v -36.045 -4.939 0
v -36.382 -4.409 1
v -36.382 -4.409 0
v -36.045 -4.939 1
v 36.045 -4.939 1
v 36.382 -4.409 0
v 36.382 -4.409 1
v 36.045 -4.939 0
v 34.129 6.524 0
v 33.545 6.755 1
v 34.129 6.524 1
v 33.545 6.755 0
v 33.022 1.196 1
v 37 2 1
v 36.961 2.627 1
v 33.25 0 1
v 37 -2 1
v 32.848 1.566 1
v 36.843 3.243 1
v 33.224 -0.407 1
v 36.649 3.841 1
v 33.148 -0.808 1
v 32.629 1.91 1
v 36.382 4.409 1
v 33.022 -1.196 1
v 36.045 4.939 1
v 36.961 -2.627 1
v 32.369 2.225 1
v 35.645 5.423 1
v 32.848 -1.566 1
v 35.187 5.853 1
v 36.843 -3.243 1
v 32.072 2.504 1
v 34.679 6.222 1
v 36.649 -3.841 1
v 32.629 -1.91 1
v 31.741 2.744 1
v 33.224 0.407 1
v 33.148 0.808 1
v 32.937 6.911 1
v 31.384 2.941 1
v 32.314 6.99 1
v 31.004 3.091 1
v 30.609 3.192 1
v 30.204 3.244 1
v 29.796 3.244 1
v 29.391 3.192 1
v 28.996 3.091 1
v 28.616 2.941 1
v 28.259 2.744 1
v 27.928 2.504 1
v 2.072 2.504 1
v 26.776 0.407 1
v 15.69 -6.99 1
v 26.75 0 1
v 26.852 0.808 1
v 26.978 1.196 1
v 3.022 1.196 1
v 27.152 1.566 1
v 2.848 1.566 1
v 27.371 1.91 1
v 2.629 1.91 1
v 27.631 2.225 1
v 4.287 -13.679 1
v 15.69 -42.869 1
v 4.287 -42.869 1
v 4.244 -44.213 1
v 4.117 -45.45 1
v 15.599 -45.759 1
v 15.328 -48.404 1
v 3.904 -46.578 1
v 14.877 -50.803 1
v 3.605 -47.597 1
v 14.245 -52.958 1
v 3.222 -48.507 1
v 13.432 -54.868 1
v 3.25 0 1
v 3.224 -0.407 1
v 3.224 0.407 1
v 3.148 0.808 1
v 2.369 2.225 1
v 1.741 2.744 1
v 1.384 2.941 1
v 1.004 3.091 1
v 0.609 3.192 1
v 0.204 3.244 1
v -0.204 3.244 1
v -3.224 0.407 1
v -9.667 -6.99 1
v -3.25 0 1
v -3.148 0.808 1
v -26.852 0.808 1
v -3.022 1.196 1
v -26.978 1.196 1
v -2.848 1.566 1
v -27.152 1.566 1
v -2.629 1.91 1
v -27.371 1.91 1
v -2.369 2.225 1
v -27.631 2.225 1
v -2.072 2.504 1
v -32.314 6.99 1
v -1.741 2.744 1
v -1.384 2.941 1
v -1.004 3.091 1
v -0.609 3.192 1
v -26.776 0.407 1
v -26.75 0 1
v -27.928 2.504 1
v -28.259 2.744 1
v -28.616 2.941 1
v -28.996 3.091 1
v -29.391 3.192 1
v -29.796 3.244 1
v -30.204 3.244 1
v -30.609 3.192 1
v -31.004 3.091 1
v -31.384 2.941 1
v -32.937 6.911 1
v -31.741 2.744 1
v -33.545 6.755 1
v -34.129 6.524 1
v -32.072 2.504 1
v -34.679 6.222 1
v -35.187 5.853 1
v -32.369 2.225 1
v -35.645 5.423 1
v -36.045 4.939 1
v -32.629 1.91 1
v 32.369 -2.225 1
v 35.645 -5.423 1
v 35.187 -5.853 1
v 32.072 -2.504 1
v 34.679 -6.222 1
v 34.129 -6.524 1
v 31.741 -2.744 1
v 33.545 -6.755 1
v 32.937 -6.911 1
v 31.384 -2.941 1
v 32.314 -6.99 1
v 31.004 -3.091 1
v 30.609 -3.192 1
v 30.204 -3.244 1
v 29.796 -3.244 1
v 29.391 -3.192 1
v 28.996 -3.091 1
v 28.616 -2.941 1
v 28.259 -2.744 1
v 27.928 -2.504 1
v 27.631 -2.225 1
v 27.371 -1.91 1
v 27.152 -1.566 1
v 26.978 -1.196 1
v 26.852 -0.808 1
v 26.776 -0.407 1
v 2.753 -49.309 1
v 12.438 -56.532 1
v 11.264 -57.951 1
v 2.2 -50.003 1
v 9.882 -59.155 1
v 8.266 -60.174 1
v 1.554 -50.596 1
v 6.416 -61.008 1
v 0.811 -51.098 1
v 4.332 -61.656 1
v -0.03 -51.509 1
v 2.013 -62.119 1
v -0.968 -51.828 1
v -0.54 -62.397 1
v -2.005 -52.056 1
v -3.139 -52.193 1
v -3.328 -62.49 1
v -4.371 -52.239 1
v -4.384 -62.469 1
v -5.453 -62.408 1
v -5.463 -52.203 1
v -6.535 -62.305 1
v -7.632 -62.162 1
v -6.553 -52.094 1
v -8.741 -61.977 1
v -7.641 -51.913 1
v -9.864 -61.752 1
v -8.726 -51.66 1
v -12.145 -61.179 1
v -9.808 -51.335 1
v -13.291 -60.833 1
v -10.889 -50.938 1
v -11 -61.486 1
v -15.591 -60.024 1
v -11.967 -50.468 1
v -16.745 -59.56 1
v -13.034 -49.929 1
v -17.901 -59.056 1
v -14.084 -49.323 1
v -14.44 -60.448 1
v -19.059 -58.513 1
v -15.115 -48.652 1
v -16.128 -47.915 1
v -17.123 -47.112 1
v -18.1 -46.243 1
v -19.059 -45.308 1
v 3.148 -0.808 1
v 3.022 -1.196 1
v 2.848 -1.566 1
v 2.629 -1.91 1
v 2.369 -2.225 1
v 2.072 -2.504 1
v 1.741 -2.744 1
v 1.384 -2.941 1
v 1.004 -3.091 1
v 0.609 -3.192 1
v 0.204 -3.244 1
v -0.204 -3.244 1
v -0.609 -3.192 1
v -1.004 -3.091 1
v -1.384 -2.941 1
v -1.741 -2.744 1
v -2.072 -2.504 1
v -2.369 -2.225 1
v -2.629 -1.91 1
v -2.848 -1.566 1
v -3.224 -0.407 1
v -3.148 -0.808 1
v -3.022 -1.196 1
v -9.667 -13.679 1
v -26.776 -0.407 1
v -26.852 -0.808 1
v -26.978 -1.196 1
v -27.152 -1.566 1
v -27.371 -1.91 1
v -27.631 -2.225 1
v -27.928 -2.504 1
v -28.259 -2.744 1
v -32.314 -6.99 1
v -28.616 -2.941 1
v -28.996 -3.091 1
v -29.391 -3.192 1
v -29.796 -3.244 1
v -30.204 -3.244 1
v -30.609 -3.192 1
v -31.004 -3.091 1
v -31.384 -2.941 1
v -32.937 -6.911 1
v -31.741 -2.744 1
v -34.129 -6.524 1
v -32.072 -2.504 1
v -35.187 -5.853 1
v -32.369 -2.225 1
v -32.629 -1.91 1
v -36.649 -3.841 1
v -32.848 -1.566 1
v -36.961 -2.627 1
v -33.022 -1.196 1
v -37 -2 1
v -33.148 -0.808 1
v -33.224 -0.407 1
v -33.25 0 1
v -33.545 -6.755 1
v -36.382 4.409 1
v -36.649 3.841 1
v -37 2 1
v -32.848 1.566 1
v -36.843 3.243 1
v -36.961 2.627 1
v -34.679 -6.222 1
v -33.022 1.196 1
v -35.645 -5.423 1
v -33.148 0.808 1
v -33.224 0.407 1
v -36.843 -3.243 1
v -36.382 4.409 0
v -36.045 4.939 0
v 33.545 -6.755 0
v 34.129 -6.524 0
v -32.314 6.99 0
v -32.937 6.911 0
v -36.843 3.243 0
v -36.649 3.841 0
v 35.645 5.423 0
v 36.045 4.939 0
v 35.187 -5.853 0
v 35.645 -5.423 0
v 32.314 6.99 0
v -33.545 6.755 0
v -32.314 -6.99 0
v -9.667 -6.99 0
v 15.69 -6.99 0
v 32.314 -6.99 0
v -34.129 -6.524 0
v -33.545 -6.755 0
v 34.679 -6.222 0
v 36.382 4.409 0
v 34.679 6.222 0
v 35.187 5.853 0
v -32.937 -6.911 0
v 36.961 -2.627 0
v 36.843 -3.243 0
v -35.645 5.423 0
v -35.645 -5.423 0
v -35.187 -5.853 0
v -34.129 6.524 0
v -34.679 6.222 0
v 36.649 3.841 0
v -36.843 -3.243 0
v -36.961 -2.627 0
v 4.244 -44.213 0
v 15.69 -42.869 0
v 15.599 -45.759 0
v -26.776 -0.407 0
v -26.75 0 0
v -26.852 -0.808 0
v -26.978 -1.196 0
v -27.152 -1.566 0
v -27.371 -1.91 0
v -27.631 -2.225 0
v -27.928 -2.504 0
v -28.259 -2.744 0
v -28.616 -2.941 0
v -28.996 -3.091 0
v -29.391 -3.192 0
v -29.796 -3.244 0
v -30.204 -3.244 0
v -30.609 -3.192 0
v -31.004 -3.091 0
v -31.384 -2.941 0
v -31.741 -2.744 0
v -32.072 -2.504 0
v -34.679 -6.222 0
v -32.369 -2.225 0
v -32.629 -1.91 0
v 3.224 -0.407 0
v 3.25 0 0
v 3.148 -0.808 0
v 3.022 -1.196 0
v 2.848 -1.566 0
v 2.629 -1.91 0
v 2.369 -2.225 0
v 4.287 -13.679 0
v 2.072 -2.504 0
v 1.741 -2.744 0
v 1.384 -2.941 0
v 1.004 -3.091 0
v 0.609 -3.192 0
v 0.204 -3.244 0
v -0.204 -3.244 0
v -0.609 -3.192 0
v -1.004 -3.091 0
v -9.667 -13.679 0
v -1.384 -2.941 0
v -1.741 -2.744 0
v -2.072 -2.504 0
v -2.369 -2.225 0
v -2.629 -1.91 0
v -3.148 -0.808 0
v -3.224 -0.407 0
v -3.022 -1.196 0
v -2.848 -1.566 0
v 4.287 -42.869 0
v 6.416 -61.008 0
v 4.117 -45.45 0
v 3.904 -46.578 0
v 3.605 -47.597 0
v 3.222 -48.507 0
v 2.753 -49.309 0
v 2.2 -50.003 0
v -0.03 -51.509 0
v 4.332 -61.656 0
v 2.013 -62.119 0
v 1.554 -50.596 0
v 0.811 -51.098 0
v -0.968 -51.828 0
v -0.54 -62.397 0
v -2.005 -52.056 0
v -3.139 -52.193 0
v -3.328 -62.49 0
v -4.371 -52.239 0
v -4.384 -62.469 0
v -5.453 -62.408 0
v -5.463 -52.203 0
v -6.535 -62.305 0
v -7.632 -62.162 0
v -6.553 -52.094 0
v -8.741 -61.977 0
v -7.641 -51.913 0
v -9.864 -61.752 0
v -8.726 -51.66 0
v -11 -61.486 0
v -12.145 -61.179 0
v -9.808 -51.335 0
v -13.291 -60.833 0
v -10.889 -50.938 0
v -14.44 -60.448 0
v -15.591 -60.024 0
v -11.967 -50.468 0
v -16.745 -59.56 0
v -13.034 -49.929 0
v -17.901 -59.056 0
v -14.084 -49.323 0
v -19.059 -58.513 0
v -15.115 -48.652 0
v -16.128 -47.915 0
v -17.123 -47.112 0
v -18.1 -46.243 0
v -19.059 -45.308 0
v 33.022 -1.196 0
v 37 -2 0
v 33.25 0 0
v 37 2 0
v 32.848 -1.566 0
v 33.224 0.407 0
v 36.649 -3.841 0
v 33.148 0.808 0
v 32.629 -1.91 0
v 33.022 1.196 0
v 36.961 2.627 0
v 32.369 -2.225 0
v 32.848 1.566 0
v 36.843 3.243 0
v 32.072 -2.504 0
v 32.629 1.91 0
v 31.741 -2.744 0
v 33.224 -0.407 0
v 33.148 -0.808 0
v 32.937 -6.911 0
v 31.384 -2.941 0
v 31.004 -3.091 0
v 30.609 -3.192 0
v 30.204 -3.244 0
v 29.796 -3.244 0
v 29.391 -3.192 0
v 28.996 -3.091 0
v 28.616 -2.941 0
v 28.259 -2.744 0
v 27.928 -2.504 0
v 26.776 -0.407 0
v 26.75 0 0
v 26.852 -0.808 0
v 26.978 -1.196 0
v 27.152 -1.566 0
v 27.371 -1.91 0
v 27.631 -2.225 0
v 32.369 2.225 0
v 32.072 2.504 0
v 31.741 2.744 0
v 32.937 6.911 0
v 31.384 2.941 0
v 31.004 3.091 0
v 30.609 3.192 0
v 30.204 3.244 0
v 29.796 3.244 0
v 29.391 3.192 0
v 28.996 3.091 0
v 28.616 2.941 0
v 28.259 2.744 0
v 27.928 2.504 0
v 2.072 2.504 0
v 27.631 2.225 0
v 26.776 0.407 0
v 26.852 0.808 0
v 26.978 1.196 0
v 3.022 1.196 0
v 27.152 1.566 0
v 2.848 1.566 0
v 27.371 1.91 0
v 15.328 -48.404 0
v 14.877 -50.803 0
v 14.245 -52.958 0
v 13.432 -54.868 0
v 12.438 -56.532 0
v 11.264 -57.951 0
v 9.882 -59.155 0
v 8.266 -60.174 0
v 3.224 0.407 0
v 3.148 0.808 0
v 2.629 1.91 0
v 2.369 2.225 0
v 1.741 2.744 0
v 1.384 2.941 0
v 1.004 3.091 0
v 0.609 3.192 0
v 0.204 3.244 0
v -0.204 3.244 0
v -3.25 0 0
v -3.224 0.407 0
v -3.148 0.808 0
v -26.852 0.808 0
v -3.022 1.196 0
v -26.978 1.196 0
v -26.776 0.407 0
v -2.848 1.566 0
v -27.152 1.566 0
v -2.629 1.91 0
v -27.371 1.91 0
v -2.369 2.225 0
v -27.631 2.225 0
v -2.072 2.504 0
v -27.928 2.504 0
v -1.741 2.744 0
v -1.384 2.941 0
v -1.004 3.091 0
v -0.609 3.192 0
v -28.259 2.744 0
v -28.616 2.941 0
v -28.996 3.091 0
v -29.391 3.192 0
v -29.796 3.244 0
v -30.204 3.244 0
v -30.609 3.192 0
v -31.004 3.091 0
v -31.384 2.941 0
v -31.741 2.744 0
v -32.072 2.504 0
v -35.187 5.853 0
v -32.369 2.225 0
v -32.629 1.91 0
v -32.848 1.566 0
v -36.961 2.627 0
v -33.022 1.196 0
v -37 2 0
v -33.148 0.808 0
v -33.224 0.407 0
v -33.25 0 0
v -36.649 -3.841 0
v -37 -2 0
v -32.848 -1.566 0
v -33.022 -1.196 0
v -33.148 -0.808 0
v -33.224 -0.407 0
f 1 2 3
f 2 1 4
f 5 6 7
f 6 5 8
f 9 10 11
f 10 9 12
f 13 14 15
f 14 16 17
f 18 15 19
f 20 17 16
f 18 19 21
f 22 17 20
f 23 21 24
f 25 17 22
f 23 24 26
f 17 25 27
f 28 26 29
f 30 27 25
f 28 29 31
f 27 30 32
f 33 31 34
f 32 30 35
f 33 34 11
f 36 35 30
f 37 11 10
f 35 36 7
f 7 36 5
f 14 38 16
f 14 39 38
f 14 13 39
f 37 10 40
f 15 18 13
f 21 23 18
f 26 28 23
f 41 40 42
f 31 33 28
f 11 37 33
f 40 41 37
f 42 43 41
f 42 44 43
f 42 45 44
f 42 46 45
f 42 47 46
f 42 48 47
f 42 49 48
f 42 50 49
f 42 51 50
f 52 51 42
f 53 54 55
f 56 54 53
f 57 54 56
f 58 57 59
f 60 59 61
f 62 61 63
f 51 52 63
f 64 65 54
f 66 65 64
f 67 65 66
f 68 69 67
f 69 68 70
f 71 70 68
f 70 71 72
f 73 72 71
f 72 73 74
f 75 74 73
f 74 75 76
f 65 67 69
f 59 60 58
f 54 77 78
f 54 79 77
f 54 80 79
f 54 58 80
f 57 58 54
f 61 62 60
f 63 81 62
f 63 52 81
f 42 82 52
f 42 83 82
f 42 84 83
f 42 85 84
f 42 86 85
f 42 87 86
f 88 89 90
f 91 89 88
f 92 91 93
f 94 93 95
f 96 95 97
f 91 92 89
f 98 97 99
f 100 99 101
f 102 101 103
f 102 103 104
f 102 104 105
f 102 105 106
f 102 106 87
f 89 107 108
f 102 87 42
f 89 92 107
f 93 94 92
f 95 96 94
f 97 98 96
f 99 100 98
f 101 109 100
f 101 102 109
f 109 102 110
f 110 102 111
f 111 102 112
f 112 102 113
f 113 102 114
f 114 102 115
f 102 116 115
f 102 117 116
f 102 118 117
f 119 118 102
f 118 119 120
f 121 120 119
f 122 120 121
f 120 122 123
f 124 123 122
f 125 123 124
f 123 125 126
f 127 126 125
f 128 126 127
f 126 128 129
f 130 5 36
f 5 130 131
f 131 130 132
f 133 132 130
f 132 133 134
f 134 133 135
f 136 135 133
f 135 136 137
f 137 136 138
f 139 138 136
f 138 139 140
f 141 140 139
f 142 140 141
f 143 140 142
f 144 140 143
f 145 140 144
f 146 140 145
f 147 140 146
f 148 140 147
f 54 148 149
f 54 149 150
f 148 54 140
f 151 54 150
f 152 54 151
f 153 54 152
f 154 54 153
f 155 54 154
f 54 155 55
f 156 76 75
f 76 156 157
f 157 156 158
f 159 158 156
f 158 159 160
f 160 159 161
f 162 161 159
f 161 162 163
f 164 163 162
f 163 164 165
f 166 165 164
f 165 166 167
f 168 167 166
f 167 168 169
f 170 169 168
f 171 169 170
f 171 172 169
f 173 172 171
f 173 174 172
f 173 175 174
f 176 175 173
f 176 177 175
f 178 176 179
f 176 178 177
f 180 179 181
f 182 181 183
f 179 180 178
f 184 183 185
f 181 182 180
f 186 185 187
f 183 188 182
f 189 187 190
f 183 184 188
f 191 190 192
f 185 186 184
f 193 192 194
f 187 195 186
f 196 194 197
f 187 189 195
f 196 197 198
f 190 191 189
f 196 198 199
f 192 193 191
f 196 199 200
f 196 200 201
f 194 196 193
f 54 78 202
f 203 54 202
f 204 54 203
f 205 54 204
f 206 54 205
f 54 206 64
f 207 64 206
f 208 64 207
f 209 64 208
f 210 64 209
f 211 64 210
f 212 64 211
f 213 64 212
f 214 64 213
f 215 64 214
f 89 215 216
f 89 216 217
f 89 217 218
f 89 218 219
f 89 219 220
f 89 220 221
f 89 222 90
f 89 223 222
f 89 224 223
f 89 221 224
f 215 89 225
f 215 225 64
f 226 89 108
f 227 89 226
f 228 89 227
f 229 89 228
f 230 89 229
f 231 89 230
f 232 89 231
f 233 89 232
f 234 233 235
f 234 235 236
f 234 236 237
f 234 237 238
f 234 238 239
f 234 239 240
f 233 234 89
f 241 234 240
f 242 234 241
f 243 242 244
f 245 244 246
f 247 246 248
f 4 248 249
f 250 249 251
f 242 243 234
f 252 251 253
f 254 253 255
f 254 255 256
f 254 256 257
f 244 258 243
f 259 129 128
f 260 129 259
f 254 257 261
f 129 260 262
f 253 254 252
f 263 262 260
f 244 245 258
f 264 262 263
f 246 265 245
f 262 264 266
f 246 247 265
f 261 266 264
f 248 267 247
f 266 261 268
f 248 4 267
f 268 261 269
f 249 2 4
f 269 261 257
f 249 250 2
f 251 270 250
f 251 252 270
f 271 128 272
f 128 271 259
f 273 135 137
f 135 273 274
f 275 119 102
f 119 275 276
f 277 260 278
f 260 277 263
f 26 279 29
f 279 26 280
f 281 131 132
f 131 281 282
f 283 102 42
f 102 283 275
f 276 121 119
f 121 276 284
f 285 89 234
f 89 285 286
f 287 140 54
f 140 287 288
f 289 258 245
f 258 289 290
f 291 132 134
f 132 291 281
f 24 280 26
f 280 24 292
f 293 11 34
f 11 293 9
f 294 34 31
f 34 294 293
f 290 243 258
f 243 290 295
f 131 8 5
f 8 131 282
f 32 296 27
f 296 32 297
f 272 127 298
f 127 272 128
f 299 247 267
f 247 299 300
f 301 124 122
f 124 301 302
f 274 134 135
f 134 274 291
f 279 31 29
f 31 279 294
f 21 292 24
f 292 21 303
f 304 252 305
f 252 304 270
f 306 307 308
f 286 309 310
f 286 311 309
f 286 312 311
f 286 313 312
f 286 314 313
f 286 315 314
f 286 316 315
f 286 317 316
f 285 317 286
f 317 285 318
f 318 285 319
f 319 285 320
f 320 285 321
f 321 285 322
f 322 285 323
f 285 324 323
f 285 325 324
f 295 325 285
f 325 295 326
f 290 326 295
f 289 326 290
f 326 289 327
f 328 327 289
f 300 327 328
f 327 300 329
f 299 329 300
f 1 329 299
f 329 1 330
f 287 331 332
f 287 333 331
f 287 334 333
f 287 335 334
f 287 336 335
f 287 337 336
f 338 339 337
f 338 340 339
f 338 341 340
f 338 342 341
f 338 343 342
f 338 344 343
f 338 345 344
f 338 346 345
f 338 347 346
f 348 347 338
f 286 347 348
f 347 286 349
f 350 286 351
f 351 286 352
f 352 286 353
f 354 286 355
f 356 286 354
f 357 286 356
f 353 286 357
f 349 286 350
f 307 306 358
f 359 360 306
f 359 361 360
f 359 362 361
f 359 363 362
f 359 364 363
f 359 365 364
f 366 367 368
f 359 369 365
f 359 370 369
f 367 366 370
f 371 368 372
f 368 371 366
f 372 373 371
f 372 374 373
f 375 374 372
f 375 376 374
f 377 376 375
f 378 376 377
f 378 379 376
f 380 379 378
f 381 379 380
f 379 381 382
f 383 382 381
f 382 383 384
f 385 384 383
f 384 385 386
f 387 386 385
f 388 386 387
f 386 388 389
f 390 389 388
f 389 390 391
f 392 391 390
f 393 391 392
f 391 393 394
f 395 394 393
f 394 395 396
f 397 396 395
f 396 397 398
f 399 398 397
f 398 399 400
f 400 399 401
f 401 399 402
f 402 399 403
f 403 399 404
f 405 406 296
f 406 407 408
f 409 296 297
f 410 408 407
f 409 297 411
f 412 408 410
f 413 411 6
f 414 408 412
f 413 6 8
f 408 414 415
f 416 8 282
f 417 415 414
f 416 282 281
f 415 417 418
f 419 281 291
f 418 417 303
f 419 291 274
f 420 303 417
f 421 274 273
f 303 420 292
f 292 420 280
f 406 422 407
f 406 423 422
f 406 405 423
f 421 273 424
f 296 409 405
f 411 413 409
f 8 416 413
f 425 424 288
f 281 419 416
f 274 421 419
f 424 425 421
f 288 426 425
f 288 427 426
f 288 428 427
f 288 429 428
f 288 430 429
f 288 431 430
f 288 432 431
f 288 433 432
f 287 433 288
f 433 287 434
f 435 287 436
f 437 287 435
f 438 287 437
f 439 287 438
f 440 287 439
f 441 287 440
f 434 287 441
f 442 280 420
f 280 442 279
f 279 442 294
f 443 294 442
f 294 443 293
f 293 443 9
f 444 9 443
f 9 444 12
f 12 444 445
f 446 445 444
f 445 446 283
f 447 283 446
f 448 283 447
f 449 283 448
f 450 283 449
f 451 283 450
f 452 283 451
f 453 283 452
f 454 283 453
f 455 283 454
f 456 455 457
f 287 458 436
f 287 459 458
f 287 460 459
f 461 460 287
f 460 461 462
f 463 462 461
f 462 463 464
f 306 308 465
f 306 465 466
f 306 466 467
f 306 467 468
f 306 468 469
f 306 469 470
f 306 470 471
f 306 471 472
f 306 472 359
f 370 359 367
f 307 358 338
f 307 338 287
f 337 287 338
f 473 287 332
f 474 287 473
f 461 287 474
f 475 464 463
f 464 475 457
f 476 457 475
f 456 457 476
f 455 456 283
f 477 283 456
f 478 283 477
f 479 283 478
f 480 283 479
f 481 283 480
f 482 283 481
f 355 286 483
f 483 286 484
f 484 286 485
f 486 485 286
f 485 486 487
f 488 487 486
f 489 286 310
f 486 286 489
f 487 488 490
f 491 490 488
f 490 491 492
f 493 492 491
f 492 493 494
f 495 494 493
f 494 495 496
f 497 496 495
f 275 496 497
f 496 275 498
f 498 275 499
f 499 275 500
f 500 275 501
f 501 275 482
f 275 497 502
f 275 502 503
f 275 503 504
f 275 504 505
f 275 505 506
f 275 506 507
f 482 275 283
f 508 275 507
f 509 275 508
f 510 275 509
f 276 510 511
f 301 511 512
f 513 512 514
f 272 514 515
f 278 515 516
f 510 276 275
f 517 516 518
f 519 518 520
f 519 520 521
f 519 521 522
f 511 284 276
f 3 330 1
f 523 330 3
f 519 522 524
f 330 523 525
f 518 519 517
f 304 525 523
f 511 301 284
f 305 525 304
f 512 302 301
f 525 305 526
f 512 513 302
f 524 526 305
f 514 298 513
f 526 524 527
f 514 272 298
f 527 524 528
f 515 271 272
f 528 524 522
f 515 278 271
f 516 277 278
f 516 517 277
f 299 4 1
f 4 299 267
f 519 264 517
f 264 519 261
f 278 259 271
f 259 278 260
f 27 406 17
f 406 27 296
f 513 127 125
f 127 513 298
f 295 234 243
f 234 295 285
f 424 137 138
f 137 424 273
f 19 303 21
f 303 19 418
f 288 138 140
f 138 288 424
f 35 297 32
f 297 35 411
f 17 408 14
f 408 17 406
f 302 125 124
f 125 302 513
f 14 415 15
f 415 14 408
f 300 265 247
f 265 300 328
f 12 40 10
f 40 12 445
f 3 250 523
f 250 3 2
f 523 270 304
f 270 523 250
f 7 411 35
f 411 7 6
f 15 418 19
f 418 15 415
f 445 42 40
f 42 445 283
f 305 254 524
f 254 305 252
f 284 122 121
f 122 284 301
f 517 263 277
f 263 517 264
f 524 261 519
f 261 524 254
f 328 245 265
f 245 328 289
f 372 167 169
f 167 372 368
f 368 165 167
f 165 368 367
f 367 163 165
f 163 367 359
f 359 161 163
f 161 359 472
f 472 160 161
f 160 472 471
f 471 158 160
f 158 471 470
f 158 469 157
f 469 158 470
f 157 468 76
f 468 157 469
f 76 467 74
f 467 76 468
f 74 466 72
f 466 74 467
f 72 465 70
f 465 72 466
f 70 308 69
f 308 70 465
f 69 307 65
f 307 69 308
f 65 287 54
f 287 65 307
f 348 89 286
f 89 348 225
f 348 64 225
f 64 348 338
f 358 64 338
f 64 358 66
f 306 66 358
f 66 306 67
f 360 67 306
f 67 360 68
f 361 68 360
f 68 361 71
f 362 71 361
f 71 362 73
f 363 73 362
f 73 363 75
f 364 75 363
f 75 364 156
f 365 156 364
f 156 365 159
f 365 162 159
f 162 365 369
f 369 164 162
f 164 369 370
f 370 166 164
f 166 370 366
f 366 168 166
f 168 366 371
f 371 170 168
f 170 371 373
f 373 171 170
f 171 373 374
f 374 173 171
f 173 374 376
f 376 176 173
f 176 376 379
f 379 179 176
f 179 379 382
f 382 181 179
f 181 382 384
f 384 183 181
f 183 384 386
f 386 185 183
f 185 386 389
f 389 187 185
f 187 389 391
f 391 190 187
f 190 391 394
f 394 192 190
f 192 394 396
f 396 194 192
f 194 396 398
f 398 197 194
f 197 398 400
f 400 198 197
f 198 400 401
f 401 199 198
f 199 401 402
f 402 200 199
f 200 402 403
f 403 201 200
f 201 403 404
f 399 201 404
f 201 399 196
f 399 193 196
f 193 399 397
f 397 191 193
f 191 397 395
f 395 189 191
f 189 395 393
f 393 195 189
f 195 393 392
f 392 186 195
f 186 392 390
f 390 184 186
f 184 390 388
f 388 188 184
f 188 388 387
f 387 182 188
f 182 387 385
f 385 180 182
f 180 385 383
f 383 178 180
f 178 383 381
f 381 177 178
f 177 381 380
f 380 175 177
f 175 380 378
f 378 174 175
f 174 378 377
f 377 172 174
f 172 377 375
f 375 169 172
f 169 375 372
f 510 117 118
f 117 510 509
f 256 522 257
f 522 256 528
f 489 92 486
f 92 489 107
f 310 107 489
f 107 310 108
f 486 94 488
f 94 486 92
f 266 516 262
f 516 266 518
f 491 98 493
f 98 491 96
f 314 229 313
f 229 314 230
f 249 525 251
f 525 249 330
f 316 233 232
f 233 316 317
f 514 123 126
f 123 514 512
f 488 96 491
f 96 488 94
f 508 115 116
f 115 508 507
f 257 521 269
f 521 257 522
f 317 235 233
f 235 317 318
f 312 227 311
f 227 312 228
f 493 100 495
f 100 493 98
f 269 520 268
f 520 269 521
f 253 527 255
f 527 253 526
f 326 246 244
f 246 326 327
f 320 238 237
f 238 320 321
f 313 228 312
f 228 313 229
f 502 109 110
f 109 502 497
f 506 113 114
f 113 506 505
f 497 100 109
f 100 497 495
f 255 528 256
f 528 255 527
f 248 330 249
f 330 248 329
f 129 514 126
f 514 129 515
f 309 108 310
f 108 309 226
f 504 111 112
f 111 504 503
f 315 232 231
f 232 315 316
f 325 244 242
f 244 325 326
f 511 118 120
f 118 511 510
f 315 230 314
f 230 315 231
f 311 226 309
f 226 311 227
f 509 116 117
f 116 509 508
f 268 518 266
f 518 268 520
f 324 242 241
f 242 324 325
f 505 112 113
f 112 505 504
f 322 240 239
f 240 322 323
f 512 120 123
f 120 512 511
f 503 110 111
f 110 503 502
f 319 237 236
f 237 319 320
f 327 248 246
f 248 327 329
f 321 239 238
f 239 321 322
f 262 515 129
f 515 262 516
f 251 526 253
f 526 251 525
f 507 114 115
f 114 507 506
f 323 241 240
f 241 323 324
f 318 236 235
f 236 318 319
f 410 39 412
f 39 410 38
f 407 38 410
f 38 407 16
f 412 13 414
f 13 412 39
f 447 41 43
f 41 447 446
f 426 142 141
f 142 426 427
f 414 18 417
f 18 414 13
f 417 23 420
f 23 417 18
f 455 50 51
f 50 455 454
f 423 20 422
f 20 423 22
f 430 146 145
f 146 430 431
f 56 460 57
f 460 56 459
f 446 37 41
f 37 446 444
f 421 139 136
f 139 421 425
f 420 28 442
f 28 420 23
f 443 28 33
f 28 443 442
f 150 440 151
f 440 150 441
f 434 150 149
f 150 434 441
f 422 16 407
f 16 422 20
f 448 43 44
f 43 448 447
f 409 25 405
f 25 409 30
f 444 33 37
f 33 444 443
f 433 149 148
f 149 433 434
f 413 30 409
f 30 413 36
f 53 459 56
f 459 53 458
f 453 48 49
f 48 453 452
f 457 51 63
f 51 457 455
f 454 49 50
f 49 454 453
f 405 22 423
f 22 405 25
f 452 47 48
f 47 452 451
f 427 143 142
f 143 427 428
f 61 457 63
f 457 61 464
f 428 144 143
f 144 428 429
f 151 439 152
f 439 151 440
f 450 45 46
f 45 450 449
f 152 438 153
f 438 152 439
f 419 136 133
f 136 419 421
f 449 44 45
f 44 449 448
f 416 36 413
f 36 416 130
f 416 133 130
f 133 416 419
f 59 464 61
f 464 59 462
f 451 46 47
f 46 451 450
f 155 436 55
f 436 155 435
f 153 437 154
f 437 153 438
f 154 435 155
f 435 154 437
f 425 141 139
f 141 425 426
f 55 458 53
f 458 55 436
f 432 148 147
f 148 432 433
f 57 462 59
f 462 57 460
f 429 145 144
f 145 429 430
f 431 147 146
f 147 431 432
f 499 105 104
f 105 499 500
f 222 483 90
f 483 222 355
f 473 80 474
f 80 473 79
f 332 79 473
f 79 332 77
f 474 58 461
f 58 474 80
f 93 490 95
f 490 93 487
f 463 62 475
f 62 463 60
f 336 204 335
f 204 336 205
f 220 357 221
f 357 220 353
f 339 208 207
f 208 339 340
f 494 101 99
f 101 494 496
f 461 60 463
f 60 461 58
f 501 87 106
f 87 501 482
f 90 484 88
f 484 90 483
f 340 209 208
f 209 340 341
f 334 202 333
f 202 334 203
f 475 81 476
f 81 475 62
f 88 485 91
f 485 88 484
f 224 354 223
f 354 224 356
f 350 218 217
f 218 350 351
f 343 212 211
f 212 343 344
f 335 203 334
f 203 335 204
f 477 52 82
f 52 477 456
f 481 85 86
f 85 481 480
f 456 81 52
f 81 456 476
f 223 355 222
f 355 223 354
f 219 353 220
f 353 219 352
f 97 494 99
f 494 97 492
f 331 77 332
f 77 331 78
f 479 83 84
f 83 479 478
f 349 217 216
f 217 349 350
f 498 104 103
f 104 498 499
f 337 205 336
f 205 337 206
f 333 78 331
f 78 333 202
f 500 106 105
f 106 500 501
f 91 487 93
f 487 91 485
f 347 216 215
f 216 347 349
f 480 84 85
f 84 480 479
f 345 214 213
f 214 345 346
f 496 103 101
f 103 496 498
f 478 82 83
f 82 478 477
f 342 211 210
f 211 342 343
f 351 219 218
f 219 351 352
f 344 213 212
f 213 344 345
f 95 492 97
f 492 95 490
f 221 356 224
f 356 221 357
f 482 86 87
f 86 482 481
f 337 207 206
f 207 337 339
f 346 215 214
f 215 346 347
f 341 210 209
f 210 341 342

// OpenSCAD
$fn = 50;


difference() {
	union() {
		translate(v = [0, 0, 0]) {
			rotate(a = [0, 0, 0]) {
				hull() {
					translate(v = [-32.0000000000, 2.0000000000, 0]) {
						rotate(a = [0, 0, 0]) {
							translate(v = [0, 0, 0]) {
								rotate(a = [0, 0, 0]) {
									cylinder(h = 1, r = 5);
								}
							}
						}
					}
					translate(v = [32.0000000000, 2.0000000000, 0]) {
						rotate(a = [0, 0, 0]) {
							translate(v = [0, 0, 0]) {
								rotate(a = [0, 0, 0]) {
									cylinder(h = 1, r = 5);
								}
							}
						}
					}
					translate(v = [-32.0000000000, -2.0000000000, 0]) {
						rotate(a = [0, 0, 0]) {
							translate(v = [0, 0, 0]) {
								rotate(a = [0, 0, 0]) {
									cylinder(h = 1, r = 5);
								}
							}
						}
					}
					translate(v = [32.0000000000, -2.0000000000, 0]) {
						rotate(a = [0, 0, 0]) {
							translate(v = [0, 0, 0]) {
								rotate(a = [0, 0, 0]) {
									cylinder(h = 1, r = 5);
								}
							}
						}
					}
				}
			}
		}
		translate(v = [0, -5, 0]) {
			rotate(a = [0, 0, 0]) {
				linear_extrude(height = 1) {
					text(font = "DejaVu Sans Mono:style=Bold", halign = "center", size = 57.0000000000, text = "J", valign = "top");
				}
			}
		}
	}
	union() {
		translate(v = [-30.0000000000, 0.0000000000, -125.0000000000]) {
			rotate(a = [0, 0, 0]) {
				cylinder(h = 250, r = 3.2500000000);
			}
		}
		translate(v = [30.0000000000, 0.0000000000, -125.0000000000]) {
			rotate(a = [0, 0, 0]) {
				cylinder(h = 250, r = 3.2500000000);
			}
		}
		translate(v = [30.0000000000, 0.0000000000, -125.0000000000]) {
			rotate(a = [0, 0, 0]) {
				cylinder(h = 250, r = 3.2500000000);
			}
		}
		translate(v = [0, 0, -125.0000000000]) {
			rotate(a = [0, 0, 0]) {
				cylinder(h = 250, r = 3.2500000000);
			}
		}
	}
}
